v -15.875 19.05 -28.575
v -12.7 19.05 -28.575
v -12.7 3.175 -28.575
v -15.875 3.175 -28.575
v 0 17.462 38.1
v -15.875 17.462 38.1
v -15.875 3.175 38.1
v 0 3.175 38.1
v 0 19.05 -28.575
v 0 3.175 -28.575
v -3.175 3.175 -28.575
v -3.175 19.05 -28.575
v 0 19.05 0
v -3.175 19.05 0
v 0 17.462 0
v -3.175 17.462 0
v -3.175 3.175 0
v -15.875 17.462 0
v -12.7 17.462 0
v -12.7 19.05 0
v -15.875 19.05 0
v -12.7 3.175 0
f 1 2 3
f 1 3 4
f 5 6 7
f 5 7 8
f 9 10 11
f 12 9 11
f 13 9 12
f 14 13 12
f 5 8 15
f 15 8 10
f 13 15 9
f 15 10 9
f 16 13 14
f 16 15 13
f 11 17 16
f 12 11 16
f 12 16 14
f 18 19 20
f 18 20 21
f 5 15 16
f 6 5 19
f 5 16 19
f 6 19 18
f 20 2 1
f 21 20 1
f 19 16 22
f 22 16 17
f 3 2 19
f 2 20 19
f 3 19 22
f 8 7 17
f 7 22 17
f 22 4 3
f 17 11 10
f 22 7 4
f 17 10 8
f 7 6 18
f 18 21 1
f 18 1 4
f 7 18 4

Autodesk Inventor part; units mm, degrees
ref_plane "YZ Plane" through (0, 0, 0) normal (1, 0, 0) x (0, 1, 0)
ref_plane "XZ Plane" through (0, 0, 0) normal (0, 1, 0) x (-1, 0, 0)
ref_plane "XY Plane" through (0, 0, 0) normal (0, 0, 1) x (1, 0, 0)
sketch "Sketch1" plane through (0, 0, 0) normal (0, 1, 0) x (-1, 0, 0)
  line L0 (0, 0) -> (0, -28.575)
  line L1 (0, 0) -> (15.875, 0)
  line L2 (15.875, 0) -> (15.875, -28.575)
  line L3 (0, -28.575) -> (15.875, -28.575)
  dimension "d0" = 28.575
  dimension "d1" = 15.875
extrude "Extrusion1" add sketch "Sketch1" along normal blind 22.225
sketch "Sketch2" plane through (-15.875, 0, 0) normal (0, 0, 1) x (1, 0, 0)
  line L0 (3.175, 3.175) -> (12.7, 3.175)
  line L1 (12.7, 3.175) -> (12.7, 19.05)
  line L2 (12.7, 19.05) -> (3.175, 19.05)
  line L3 (3.175, 19.05) -> (3.175, 3.175)
  line L4 (0, 0) -> (15.875, 0) construction
  line L5 (15.875, 0) -> (15.875, 22.225) construction
  line L6 (15.875, 22.225) -> (0, 22.225) construction
  line L7 (0, 22.225) -> (0, 0) construction
  dimension "d4" = 9.525
  dimension "d5" = 15.875
  dimension "d6" = 3.175
  dimension "d7" = 3.175
  dimension "d8" = 3.175
extrude "Extrusion2" cut sketch "Sketch2" against normal blind 50.8
sketch "Sketch3" plane through (-15.875, 0, 0) normal (0, 0, 1) x (1, 0, 0)
  line L0 (15.875, 0) -> (15.875, 22.225) projected
  line L1 (0, 22.225) -> (15.875, 22.225)
  line L2 (15.875, 22.225) -> (15.875, 19.05)
  line L3 (15.875, 19.05) -> (0, 19.05)
  line L4 (0, 19.05) -> (0, 22.225)
  line L5 (3.175, 19.05) -> (12.7, 19.05) construction
  line L6 (3.175, 19.05) -> (12.7, 19.05) projected
extrude "Extrusion3" cut sketch "Sketch3" against normal blind 50.8
sketch "Sketch4" plane through (-15.875, 0, 0) normal (0, 0, 1) x (1, 0, 0)
  line L0 (15.875, 0) -> (15.875, 19.05) projected
  line L1 (0, 0) -> (15.875, 0)
  line L2 (15.875, 0) -> (15.875, 3.175)
  line L3 (15.875, 3.175) -> (0, 3.175)
  line L4 (0, 3.175) -> (0, 0)
  point P0 (12.7, 3.175)
extrude "Extrusion4" cut sketch "Sketch4" against normal blind 50.8
sketch "Sketch5" plane through (-15.875, 19.05, 0) normal (0, 0, 1) x (1, 0, 0)
  line L0 (0, -15.875) -> (0, -1.5875)
  line L1 (0, -15.875) -> (3.175, -15.875)
  line L2 (0, -15.875) -> (3.175, -15.875) projected
  line L3 (3.175, -15.875) -> (3.175, -1.5875)
  line L4 (12.7, -15.875) -> (15.875, -15.875)
  line L5 (15.875, -15.875) -> (12.7, -15.875) projected
  line L6 (15.875, -15.875) -> (15.875, -1.5875)
  line L7 (12.7, -15.875) -> (12.7, -1.5875)
  line L8 (0, -1.5875) -> (3.175, -1.5875)
  line L9 (0, -15.875) -> (0, 0) projected
  line L10 (15.875, -1.5875) -> (12.7, -1.5875)
  line L11 (12.7, -15.875) -> (12.7, 0) projected
  line L12 (3.175, 0) -> (0, 0) projected
  line L13 (15.875, 0) -> (12.7, 0) projected
  line L14 (12.7, -15.875) -> (15.875, -15.875) projected
  line L15 (15.875, -15.875) -> (15.875, 0) projected
  point P0 (15.875, -19.05)
  dimension "d15" = 1.5875
  dimension "d16" = 1.5875
  dimension "d17" = 14.2875
extrude "Extrusion5" add sketch "Sketch5" along normal blind 6.35 contours L0 L8 L3 L1 | L7 L10 L6 L4
sketch "Sketch6" plane through (-3.175, 19.05, -28.575) normal (-1, 0, 0) x (0, 0, 1)
  line L0 (34.925, -15.875) -> (0, -15.875) projected
  line L1 (34.925, -1.5875) -> (28.575, -1.5875)
  line L2 (28.575, -1.5875) -> (28.575, -15.875)
  line L3 (28.575, -15.875) -> (34.925, -15.875)
  line L4 (34.925, -15.875) -> (34.925, -1.5875)
  point P0 (28.575, -19.05)
  dimension "d20" = 6.35
extrude "Extrusion6" add sketch "Sketch6" along normal blind 9.525
sketch "Sketch7" plane through (-15.875, 19.05, 6.35) normal (0, 0, 1) x (1, 0, 0)
  line L0 (0, -15.875) -> (15.875, -15.875)
  line L1 (15.875, -15.875) -> (15.875, -1.5875)
  line L2 (15.875, -1.5875) -> (0, -1.5875)
  line L3 (0, -1.5875) -> (0, -15.875)
  point P0 (15.875, -19.05)
extrude "Extrusion7" add sketch "Sketch7" along normal blind 31.75
properties part number "Limit Switch Container"
